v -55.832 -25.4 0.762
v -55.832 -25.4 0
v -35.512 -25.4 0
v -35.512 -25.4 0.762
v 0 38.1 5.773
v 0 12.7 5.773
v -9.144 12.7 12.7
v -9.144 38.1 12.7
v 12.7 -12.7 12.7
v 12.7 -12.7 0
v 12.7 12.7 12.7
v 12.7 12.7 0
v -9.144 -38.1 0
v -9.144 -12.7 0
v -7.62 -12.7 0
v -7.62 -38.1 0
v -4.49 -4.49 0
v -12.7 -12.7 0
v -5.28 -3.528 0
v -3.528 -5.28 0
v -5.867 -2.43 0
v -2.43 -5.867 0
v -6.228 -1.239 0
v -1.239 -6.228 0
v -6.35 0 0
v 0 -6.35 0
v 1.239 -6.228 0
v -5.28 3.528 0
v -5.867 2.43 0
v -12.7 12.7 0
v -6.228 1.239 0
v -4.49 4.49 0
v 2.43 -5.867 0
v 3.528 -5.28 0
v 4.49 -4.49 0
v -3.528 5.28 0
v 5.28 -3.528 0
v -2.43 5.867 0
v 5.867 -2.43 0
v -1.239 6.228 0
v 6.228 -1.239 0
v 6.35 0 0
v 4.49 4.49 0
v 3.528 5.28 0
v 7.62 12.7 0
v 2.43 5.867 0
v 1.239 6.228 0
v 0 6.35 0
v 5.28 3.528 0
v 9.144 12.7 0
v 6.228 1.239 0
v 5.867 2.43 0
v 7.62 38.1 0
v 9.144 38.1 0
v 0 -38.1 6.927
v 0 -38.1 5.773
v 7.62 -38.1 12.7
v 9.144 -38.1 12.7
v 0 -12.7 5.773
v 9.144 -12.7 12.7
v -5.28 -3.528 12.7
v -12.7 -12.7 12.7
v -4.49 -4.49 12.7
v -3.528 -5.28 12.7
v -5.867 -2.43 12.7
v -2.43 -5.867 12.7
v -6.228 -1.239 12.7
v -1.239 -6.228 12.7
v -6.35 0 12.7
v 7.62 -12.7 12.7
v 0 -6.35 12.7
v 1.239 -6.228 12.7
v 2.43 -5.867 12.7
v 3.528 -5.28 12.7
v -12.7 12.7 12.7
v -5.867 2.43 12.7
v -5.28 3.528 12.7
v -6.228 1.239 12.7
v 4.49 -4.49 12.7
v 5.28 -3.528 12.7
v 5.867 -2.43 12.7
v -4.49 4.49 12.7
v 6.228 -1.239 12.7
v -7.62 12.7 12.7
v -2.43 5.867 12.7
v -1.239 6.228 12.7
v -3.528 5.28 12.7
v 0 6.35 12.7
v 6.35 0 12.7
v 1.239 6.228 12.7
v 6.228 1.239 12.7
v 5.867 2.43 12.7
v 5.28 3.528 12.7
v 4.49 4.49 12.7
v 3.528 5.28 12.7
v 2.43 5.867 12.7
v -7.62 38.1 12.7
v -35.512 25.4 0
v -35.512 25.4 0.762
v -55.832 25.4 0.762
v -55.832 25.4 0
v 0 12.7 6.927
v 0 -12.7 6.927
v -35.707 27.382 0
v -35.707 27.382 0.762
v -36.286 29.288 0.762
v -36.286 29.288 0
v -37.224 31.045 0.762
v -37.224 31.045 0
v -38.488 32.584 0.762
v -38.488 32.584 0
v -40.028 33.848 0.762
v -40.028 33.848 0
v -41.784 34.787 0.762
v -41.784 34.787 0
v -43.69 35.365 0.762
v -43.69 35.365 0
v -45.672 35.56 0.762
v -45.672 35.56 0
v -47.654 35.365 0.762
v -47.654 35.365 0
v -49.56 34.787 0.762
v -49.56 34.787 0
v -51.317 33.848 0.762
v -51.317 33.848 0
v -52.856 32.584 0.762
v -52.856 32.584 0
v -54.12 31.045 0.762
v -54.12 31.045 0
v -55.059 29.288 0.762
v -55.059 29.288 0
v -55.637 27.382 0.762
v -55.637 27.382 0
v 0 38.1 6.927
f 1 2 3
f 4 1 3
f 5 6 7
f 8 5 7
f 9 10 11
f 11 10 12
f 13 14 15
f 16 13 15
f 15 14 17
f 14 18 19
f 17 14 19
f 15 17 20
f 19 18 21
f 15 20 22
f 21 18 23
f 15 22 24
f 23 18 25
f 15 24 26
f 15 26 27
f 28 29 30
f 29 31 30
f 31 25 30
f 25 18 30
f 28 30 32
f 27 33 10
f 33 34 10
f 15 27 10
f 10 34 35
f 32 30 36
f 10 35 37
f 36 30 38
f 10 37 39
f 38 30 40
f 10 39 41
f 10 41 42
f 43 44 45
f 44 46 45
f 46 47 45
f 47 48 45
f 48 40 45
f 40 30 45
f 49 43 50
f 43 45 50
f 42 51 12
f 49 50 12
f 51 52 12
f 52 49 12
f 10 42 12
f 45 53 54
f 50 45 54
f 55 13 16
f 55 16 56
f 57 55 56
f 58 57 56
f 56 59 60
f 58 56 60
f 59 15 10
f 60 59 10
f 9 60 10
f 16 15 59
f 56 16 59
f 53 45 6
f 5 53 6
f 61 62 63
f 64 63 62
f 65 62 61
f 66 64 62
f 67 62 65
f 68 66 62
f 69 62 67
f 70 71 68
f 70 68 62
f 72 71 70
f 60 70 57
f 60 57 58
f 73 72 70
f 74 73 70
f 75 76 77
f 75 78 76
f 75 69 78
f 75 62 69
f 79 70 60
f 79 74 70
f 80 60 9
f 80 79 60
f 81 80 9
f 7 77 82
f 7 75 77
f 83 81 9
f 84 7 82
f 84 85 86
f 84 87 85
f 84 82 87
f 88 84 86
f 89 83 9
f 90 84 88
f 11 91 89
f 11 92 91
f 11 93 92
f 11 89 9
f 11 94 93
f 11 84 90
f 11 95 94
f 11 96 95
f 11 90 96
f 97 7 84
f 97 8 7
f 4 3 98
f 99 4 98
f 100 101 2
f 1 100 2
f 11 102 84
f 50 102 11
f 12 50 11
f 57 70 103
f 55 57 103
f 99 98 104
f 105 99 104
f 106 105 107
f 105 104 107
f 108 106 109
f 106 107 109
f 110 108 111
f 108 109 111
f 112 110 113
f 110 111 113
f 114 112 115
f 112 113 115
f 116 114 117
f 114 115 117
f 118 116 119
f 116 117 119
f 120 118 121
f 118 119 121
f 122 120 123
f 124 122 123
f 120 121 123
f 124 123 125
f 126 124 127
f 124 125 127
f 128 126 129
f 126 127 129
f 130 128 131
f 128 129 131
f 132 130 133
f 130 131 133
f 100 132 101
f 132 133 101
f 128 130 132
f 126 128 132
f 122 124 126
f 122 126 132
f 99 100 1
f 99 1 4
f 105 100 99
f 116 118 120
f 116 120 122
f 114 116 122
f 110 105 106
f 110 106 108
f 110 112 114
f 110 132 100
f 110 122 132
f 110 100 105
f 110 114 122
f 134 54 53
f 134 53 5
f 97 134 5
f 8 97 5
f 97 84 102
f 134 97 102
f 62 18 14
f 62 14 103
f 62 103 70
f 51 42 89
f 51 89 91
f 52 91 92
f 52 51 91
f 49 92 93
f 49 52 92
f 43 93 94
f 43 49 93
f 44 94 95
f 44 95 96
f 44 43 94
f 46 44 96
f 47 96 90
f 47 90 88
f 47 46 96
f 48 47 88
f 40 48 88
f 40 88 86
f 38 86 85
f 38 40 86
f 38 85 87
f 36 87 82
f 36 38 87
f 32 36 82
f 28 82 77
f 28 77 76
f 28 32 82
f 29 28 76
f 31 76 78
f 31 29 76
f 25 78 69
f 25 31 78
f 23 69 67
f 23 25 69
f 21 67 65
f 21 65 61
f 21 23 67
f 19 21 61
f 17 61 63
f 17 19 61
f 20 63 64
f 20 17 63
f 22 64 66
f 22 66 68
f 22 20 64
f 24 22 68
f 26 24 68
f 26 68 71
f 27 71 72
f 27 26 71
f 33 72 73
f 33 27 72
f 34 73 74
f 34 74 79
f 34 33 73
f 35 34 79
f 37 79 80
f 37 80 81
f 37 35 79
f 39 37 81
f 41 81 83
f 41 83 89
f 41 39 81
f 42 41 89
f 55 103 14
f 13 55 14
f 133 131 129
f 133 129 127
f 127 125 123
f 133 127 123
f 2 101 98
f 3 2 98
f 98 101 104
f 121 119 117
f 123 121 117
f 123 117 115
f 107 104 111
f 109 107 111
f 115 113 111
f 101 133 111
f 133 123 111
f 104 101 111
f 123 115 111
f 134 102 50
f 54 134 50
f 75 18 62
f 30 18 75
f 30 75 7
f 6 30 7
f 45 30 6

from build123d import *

# Parameters (mm, degrees)
F0_W     = 25.4
F0_H     = 25.4
F0_R     = 6.35
F1_DEPTH = 12.7
F3_DEPTH = 25.4
F5_DEPTH = 25.4
F7_DEPTH = 0.762


with BuildPart() as f1:
    # F0 (on Top) → F1 (new body)
    with BuildSketch(Plane.XY):
        Rectangle(F0_W, F0_H)
        Circle(F0_R, mode=Mode.SUBTRACT)
    extrude(amount=F1_DEPTH)

    # F2 (on face) → F3 (join)
    with BuildSketch(Plane(origin=(0, 12.7, 0), x_dir=(-1, 0, 0), z_dir=(0, 1, 0))):
        Polygon((7.62, 12.7), (0, 6.9272727273), (0, 5.7727272727), (9.144, 12.7), align=None)
        Polygon((0, 5.7727272727), (0, 6.9272727273), (-9.144, 0), (-7.62, 0), align=None)
    extrude(amount=F3_DEPTH)

    # F4 (on face) → F5 (join)
    with BuildSketch(Plane.XZ.offset(12.7)):
        Polygon((7.62, 12.7), (0, 6.9272727273), (0, 5.7727272727), (9.144, 12.7), align=None)
        Polygon((0, 5.7727272727), (0, 6.9272727273), (-9.144, 0), (-7.62, 0), align=None)
    extrude(amount=F5_DEPTH)


with BuildPart() as f7:
    # F6 (on Top) → F7 (new body)
    with BuildSketch(Plane.XY):
        with BuildLine():
            Line((-55.8321857466, 25.4), (-55.8321857466, -25.4))
            Line((-55.8321857466, -25.4), (-35.5121857466, -25.4))
            Line((-35.5121857466, -25.4), (-35.5121857466, 25.4))
            ThreePointArc((-35.5121857466, 25.4), (-45.6721857466, 35.56), (-55.8321857466, 25.4))
        make_face()
    extrude(amount=F7_DEPTH)


solid = Compound([f1.part, f7.part])
